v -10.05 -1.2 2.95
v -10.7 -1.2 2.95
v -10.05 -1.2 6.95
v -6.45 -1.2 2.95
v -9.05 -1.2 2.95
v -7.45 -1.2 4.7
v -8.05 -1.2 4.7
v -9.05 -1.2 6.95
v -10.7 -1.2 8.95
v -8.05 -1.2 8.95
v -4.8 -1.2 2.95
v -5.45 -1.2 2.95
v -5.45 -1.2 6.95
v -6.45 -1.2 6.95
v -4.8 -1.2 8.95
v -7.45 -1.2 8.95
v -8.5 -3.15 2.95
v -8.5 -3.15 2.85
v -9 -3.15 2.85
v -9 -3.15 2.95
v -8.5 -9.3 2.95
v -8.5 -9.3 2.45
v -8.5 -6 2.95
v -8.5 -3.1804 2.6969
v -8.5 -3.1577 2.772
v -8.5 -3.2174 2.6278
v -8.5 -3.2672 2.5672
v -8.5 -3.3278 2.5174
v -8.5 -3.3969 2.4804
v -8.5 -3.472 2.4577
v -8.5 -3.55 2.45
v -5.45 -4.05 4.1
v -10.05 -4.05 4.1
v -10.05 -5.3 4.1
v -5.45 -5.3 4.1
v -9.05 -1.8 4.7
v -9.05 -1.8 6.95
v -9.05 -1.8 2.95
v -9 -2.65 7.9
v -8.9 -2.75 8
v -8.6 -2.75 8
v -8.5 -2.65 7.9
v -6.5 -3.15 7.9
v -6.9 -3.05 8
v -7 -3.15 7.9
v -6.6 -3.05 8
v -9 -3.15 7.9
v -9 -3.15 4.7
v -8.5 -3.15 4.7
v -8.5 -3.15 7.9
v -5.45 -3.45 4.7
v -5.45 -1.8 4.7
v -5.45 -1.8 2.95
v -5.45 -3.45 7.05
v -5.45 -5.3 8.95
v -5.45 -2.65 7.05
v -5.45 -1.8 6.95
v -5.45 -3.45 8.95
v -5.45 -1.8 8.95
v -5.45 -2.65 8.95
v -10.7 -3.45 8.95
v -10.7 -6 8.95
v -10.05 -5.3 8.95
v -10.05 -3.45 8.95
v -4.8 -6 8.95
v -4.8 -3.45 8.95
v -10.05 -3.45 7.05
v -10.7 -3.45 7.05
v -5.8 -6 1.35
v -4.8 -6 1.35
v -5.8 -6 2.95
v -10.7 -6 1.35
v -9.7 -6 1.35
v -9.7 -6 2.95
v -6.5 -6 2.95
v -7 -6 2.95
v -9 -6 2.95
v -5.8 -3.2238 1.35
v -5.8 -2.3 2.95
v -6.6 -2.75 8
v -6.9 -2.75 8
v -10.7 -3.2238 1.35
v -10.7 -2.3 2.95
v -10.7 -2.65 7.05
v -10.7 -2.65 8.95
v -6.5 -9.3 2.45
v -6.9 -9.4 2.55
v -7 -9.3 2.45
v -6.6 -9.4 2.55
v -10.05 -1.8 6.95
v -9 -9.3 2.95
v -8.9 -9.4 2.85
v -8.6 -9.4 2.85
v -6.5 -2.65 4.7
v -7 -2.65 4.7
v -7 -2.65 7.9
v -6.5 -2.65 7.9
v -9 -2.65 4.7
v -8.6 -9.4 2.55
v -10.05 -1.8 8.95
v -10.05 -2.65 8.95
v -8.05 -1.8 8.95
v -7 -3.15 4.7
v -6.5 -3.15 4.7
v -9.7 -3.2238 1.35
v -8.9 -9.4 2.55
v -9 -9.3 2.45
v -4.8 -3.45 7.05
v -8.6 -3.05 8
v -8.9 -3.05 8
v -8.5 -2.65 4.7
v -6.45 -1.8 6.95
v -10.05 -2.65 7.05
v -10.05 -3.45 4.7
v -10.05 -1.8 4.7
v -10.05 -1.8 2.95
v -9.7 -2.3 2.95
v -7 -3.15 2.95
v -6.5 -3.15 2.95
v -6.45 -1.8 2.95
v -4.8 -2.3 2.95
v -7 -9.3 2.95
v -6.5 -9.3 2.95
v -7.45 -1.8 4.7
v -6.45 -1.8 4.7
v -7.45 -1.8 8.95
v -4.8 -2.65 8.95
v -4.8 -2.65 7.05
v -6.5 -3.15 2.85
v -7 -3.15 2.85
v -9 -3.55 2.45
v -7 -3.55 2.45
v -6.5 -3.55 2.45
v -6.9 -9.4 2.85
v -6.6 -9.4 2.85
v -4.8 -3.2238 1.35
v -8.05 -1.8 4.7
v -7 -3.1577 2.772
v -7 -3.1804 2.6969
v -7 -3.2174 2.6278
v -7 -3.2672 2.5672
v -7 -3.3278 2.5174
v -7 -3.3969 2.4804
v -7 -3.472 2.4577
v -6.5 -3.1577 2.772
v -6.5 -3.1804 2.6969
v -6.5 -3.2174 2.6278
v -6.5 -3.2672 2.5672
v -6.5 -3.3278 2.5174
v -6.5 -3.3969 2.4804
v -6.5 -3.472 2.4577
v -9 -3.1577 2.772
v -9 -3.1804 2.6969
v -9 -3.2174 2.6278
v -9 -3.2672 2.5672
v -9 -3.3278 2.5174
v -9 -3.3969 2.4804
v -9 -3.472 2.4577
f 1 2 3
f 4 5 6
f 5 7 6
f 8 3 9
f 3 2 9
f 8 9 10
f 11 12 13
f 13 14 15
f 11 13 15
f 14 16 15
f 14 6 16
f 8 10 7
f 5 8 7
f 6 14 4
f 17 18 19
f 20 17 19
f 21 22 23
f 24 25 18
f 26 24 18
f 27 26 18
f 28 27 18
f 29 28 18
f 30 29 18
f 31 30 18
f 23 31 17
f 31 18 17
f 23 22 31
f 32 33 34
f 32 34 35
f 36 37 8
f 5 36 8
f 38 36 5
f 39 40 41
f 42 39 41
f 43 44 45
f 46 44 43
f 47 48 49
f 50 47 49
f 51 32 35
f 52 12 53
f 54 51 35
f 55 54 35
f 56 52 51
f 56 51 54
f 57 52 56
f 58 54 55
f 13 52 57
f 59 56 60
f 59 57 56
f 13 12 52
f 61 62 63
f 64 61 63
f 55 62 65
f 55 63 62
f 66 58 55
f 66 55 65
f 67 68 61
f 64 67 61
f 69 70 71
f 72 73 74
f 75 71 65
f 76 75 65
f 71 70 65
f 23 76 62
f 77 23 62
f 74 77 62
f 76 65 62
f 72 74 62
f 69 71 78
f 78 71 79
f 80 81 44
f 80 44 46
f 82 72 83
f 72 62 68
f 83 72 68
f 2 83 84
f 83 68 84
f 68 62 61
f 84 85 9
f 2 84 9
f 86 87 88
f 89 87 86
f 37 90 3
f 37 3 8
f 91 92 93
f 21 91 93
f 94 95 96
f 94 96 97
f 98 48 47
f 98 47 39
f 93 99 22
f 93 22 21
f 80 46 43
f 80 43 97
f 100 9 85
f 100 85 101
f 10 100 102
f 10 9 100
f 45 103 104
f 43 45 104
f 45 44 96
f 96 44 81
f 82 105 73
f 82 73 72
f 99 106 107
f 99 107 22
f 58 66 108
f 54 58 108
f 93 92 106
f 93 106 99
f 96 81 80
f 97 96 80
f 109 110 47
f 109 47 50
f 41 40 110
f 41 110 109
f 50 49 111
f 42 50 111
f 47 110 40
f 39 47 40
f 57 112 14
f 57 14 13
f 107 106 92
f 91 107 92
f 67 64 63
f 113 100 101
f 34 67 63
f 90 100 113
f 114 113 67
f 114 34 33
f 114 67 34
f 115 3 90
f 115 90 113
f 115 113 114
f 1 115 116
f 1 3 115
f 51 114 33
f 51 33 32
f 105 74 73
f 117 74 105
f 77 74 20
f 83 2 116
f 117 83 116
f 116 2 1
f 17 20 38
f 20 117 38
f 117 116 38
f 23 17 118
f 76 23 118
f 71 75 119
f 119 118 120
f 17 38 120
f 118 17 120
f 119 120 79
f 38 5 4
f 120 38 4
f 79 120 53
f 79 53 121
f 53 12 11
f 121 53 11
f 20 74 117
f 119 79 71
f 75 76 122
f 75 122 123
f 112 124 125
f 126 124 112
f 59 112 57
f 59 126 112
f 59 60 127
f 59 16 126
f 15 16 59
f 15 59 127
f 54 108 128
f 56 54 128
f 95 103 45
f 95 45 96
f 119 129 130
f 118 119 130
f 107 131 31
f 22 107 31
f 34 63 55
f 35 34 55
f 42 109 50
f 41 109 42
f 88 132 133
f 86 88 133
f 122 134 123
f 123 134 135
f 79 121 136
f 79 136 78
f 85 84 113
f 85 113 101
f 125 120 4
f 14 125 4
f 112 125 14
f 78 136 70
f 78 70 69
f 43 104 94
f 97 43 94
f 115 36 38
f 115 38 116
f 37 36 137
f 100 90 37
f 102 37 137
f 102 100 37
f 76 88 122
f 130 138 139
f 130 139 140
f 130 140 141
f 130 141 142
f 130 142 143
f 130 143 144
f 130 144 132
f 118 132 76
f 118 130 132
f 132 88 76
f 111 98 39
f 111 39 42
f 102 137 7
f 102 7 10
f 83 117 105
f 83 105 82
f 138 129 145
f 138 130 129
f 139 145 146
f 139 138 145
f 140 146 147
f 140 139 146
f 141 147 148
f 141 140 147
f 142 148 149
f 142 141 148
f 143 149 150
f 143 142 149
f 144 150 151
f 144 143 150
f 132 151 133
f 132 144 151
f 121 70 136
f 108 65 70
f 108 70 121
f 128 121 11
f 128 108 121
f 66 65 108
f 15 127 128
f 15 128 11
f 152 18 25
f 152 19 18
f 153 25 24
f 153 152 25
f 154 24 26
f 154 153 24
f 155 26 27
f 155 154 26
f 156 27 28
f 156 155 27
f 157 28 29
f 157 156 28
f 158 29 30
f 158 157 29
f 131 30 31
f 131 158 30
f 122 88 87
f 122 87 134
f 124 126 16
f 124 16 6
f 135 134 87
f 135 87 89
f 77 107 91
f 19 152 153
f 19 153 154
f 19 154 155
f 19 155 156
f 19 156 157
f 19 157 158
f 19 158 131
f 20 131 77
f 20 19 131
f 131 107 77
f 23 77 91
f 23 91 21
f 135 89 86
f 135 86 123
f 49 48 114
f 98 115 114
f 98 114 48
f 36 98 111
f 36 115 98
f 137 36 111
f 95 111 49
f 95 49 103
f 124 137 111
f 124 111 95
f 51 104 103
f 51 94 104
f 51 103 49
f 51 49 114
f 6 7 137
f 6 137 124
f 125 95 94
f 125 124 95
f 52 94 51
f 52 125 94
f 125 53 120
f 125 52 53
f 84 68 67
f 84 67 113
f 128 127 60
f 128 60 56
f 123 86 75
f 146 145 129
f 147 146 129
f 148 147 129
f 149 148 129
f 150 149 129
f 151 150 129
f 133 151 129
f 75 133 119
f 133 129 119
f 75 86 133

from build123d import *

# Parameters (mm, degrees)
EXTRUDE_1_DEPTH     = 0.6
EXTRUDE_2_DEPTH     = 3.5
SKETCH_3_W          = 5.9
SKETCH_3_H          = 6
EXTRUDE_3_DEPTH     = 0.7
EXTRUDE_4_REACH     = 15.883
SKETCH_4_W          = 0.5
SKETCH_4_H          = 2.85
SKETCH_5_W          = 0.5
SKETCH_5_H          = 0.5
EXTRUDE_5_DEPTH     = 3.4
EXTRUDE_6_REACH     = 17.656
SKETCH_7_W          = 0.5
SKETCH_7_H          = 2.85
SKETCH_8_W          = 0.5
SKETCH_8_H          = 0.5
EXTRUDE_7_DEPTH     = 3.4
SKETCH_9_W          = 4.6
SKETCH_9_H          = 1.85
CUT_EXTRUDE_1_DEPTH = 0.6
CUT_EXTRUDE_2_REACH = 16.257
SKETCH_10_W         = 1.9
SKETCH_10_H         = 0.8
SKETCH_11_W         = 1.9
SKETCH_11_H         = 0.8
CUT_EXTRUDE_3_DEPTH = 15.257366517
SKETCH_12_W         = 1
SKETCH_12_H         = 3.7
EXTRUDE_8_DEPTH     = 1.6
SKETCH_13_W         = 1
SKETCH_13_H         = 3.7
EXTRUDE_9_DEPTH     = 1.6
SKETCH_14_W         = 0.5
SKETCH_14_H         = 0.5
EXTRUDE_10_DEPTH    = 3.3
SKETCH_15_W         = 0.5
SKETCH_15_H         = 0.5
EXTRUDE_11_DEPTH    = 3.3
DRAFT_1_ANGLE       = 45
DRAFT_2_ANGLE       = 30
FILLET_1_R          = 0.4
CHAMFER_1_SIZE      = 0.1


with BuildPart() as part:
    # 草图1 → 凸台-拉伸1 (new body)
    with BuildSketch(Plane.XZ.offset(1.8)):
        Polygon((-7.45, 8.95), (-7.45, 4.7), (-8.05, 4.7), (-8.05, 8.95), (-10.7, 8.95), (-10.7, 2.95), (-10.05, 2.95), (-10.05, 6.95), (-9.05, 6.95), (-9.05, 2.95), (-6.45, 2.95), (-6.45, 6.95), (-5.45, 6.95), (-5.45, 2.95), (-4.8, 2.95), (-4.8, 8.95), align=None)
    extrude(amount=-EXTRUDE_1_DEPTH)

    # 草图2 → 凸台-拉伸2 (add)
    with BuildSketch(Plane.XZ.offset(1.8)):
        Polygon((-10.7, 8.95), (-10.05, 8.95), (-10.05, 4.7), (-5.45, 4.7), (-5.45, 8.95), (-4.8, 8.95), (-4.8, 2.95), (-10.7, 2.95), align=None)
    extrude(amount=EXTRUDE_2_DEPTH)

    # 草图3 → 凸台-拉伸3 (add)
    with BuildSketch(Plane.XZ.offset(5.3)):
        with Locations((-7.75, 5.95)):
            Rectangle(SKETCH_3_W, SKETCH_3_H)
    extrude(amount=EXTRUDE_3_DEPTH)

    # 草图4 → 凸台-拉伸4 (add, up to next)
    with BuildSketch(Plane(origin=(0, 0, 2.45), x_dir=(-1, 0, 0), z_dir=(0, 0, -1)), mode=Mode.PRIVATE) as extrude_4_sk1:
        with Locations((8.75, -4.575)):
            Rectangle(SKETCH_4_W, SKETCH_4_H)
    extrude_4_tool1 = extrude(extrude_4_sk1.sketch, amount=-EXTRUDE_4_REACH, mode=Mode.PRIVATE) - part.part
    add(extrude_4_tool1.solids().sort_by_distance((-8.75, -4.575, 2.45))[0])

    # 草图5 → 凸台-拉伸5 (add)
    with BuildSketch(Plane.XZ.offset(6)):
        with Locations((-8.75, 2.7)):
            Rectangle(SKETCH_5_W, SKETCH_5_H)
    extrude(amount=EXTRUDE_5_DEPTH)

    # 草图7 → 凸台-拉伸6 (add, up to next)
    with BuildSketch(Plane(origin=(0, 0, 2.45), x_dir=(-1, 0, 0), z_dir=(0, 0, -1)), mode=Mode.PRIVATE) as extrude_6_sk1:
        with Locations((6.75, -4.575)):
            Rectangle(SKETCH_7_W, SKETCH_7_H)
    extrude_6_tool1 = extrude(extrude_6_sk1.sketch, amount=-EXTRUDE_6_REACH, mode=Mode.PRIVATE) - part.part
    add(extrude_6_tool1.solids().sort_by_distance((-6.75, -4.575, 2.45))[0])

    # 草图8 → 凸台-拉伸7 (add)
    with BuildSketch(Plane.XZ.offset(6)):
        with Locations((-6.75, 2.7)):
            Rectangle(SKETCH_8_W, SKETCH_8_H)
    extrude(amount=EXTRUDE_7_DEPTH)

    # 草图9 → 切除-拉伸1 (cut)
    with BuildSketch(Plane.XY.offset(4.7)):
        with Locations((-7.75, -4.375)):
            Rectangle(SKETCH_9_W, SKETCH_9_H)
    extrude(amount=-CUT_EXTRUDE_1_DEPTH, mode=Mode.SUBTRACT)

    # 草图10 → 切除-拉伸2 (cut, up to next)
    with BuildSketch(Plane.ZY.offset(10.7), mode=Mode.PRIVATE) as cut_extrude_2_sk1:
        with Locations((8, -3.05)):
            Rectangle(SKETCH_10_W, SKETCH_10_H)
    cut_extrude_2_tool1 = extrude(cut_extrude_2_sk1.sketch, amount=-CUT_EXTRUDE_2_REACH, mode=Mode.PRIVATE) & part.part
    add(cut_extrude_2_tool1.solids().sort_by_distance((-10.7, -3.05, 8))[0], mode=Mode.SUBTRACT)

    # 草图11 → 切除-拉伸3 (cut, through all)
    with BuildSketch(Plane(origin=(-4.8, 0, 0), x_dir=(0, 0, -1), z_dir=(1, 0, 0))):
        with Locations((-8, -3.05)):
            Rectangle(SKETCH_11_W, SKETCH_11_H)
    extrude(amount=-CUT_EXTRUDE_3_DEPTH, mode=Mode.SUBTRACT)

    # 草图12 → 凸台-拉伸8 (add)
    with BuildSketch(Plane(origin=(0, 0, 2.95), x_dir=(-1, 0, 0), z_dir=(0, 0, -1))):
        with Locations((10.2, -4.15)):
            Rectangle(SKETCH_12_W, SKETCH_12_H)
    extrude(amount=EXTRUDE_8_DEPTH)

    # 草图13 → 凸台-拉伸9 (add)
    with BuildSketch(Plane(origin=(0, 0, 2.95), x_dir=(-1, 0, 0), z_dir=(0, 0, -1))):
        with Locations((5.3, -4.15)):
            Rectangle(SKETCH_13_W, SKETCH_13_H)
    extrude(amount=EXTRUDE_9_DEPTH)

    # 草图14 → 凸台-拉伸10 (add)
    with BuildSketch(Plane.XY.offset(4.7)):
        with Locations((-6.75, -2.9)):
            Rectangle(SKETCH_14_W, SKETCH_14_H)
    extrude(amount=EXTRUDE_10_DEPTH)

    # 草图15 → 凸台-拉伸11 (add)
    with BuildSketch(Plane.XY.offset(4.7)):
        with Locations((-8.75, -2.9)):
            Rectangle(SKETCH_15_W, SKETCH_15_H)
    extrude(amount=EXTRUDE_11_DEPTH)

    # 拔模1
    draft_1_faces = [part.faces().sort_by_distance(p)[0] for p in [
        (-7.75, -3.45, 4.4),
    ]]
    draft(draft_1_faces, Plane(origin=(-7.45, -1.2, 4.7), x_dir=(0, 1, 0), z_dir=(0, 0, 1)), DRAFT_1_ANGLE)

    # 拔模2
    draft_2_faces = [part.faces().sort_by_distance(p)[0] for p in [
        (-5.3, -2.3, 2.15),
        (-10.2, -2.3, 2.15),
    ]]
    draft(draft_2_faces, Plane(origin=(-5.45, -1.2, 2.95), x_dir=(-1, 0, 0), z_dir=(0, 0, -1)), DRAFT_2_ANGLE)

    # 圆角1
    fillet_1_edges = [part.edges().sort_by_distance(p)[0] for p in [
        (-8.75, -3.15, 2.45),
        (-6.75, -3.15, 2.45),
    ]]
    fillet(fillet_1_edges, radius=FILLET_1_R)

    # 倒角1
    chamfer_1_edges = [part.edges().sort_by_distance(p)[0] for p in [
        (-6.75, -9.4, 2.95),
        (-6.5, -9.4, 2.7),
        (-6.75, -9.4, 2.45),
        (-7, -9.4, 2.7),
        (-8.75, -9.4, 2.95),
        (-8.5, -9.4, 2.7),
        (-8.75, -9.4, 2.45),
        (-9, -9.4, 2.7),
        (-6.75, -2.65, 8),
        (-6.5, -2.9, 8),
        (-6.75, -3.15, 8),
        (-7, -2.9, 8),
        (-8.75, -2.65, 8),
        (-8.5, -2.9, 8),
        (-8.75, -3.15, 8),
        (-9, -2.9, 8),
    ]]
    chamfer(chamfer_1_edges, length=CHAMFER_1_SIZE)


solid = part.part
